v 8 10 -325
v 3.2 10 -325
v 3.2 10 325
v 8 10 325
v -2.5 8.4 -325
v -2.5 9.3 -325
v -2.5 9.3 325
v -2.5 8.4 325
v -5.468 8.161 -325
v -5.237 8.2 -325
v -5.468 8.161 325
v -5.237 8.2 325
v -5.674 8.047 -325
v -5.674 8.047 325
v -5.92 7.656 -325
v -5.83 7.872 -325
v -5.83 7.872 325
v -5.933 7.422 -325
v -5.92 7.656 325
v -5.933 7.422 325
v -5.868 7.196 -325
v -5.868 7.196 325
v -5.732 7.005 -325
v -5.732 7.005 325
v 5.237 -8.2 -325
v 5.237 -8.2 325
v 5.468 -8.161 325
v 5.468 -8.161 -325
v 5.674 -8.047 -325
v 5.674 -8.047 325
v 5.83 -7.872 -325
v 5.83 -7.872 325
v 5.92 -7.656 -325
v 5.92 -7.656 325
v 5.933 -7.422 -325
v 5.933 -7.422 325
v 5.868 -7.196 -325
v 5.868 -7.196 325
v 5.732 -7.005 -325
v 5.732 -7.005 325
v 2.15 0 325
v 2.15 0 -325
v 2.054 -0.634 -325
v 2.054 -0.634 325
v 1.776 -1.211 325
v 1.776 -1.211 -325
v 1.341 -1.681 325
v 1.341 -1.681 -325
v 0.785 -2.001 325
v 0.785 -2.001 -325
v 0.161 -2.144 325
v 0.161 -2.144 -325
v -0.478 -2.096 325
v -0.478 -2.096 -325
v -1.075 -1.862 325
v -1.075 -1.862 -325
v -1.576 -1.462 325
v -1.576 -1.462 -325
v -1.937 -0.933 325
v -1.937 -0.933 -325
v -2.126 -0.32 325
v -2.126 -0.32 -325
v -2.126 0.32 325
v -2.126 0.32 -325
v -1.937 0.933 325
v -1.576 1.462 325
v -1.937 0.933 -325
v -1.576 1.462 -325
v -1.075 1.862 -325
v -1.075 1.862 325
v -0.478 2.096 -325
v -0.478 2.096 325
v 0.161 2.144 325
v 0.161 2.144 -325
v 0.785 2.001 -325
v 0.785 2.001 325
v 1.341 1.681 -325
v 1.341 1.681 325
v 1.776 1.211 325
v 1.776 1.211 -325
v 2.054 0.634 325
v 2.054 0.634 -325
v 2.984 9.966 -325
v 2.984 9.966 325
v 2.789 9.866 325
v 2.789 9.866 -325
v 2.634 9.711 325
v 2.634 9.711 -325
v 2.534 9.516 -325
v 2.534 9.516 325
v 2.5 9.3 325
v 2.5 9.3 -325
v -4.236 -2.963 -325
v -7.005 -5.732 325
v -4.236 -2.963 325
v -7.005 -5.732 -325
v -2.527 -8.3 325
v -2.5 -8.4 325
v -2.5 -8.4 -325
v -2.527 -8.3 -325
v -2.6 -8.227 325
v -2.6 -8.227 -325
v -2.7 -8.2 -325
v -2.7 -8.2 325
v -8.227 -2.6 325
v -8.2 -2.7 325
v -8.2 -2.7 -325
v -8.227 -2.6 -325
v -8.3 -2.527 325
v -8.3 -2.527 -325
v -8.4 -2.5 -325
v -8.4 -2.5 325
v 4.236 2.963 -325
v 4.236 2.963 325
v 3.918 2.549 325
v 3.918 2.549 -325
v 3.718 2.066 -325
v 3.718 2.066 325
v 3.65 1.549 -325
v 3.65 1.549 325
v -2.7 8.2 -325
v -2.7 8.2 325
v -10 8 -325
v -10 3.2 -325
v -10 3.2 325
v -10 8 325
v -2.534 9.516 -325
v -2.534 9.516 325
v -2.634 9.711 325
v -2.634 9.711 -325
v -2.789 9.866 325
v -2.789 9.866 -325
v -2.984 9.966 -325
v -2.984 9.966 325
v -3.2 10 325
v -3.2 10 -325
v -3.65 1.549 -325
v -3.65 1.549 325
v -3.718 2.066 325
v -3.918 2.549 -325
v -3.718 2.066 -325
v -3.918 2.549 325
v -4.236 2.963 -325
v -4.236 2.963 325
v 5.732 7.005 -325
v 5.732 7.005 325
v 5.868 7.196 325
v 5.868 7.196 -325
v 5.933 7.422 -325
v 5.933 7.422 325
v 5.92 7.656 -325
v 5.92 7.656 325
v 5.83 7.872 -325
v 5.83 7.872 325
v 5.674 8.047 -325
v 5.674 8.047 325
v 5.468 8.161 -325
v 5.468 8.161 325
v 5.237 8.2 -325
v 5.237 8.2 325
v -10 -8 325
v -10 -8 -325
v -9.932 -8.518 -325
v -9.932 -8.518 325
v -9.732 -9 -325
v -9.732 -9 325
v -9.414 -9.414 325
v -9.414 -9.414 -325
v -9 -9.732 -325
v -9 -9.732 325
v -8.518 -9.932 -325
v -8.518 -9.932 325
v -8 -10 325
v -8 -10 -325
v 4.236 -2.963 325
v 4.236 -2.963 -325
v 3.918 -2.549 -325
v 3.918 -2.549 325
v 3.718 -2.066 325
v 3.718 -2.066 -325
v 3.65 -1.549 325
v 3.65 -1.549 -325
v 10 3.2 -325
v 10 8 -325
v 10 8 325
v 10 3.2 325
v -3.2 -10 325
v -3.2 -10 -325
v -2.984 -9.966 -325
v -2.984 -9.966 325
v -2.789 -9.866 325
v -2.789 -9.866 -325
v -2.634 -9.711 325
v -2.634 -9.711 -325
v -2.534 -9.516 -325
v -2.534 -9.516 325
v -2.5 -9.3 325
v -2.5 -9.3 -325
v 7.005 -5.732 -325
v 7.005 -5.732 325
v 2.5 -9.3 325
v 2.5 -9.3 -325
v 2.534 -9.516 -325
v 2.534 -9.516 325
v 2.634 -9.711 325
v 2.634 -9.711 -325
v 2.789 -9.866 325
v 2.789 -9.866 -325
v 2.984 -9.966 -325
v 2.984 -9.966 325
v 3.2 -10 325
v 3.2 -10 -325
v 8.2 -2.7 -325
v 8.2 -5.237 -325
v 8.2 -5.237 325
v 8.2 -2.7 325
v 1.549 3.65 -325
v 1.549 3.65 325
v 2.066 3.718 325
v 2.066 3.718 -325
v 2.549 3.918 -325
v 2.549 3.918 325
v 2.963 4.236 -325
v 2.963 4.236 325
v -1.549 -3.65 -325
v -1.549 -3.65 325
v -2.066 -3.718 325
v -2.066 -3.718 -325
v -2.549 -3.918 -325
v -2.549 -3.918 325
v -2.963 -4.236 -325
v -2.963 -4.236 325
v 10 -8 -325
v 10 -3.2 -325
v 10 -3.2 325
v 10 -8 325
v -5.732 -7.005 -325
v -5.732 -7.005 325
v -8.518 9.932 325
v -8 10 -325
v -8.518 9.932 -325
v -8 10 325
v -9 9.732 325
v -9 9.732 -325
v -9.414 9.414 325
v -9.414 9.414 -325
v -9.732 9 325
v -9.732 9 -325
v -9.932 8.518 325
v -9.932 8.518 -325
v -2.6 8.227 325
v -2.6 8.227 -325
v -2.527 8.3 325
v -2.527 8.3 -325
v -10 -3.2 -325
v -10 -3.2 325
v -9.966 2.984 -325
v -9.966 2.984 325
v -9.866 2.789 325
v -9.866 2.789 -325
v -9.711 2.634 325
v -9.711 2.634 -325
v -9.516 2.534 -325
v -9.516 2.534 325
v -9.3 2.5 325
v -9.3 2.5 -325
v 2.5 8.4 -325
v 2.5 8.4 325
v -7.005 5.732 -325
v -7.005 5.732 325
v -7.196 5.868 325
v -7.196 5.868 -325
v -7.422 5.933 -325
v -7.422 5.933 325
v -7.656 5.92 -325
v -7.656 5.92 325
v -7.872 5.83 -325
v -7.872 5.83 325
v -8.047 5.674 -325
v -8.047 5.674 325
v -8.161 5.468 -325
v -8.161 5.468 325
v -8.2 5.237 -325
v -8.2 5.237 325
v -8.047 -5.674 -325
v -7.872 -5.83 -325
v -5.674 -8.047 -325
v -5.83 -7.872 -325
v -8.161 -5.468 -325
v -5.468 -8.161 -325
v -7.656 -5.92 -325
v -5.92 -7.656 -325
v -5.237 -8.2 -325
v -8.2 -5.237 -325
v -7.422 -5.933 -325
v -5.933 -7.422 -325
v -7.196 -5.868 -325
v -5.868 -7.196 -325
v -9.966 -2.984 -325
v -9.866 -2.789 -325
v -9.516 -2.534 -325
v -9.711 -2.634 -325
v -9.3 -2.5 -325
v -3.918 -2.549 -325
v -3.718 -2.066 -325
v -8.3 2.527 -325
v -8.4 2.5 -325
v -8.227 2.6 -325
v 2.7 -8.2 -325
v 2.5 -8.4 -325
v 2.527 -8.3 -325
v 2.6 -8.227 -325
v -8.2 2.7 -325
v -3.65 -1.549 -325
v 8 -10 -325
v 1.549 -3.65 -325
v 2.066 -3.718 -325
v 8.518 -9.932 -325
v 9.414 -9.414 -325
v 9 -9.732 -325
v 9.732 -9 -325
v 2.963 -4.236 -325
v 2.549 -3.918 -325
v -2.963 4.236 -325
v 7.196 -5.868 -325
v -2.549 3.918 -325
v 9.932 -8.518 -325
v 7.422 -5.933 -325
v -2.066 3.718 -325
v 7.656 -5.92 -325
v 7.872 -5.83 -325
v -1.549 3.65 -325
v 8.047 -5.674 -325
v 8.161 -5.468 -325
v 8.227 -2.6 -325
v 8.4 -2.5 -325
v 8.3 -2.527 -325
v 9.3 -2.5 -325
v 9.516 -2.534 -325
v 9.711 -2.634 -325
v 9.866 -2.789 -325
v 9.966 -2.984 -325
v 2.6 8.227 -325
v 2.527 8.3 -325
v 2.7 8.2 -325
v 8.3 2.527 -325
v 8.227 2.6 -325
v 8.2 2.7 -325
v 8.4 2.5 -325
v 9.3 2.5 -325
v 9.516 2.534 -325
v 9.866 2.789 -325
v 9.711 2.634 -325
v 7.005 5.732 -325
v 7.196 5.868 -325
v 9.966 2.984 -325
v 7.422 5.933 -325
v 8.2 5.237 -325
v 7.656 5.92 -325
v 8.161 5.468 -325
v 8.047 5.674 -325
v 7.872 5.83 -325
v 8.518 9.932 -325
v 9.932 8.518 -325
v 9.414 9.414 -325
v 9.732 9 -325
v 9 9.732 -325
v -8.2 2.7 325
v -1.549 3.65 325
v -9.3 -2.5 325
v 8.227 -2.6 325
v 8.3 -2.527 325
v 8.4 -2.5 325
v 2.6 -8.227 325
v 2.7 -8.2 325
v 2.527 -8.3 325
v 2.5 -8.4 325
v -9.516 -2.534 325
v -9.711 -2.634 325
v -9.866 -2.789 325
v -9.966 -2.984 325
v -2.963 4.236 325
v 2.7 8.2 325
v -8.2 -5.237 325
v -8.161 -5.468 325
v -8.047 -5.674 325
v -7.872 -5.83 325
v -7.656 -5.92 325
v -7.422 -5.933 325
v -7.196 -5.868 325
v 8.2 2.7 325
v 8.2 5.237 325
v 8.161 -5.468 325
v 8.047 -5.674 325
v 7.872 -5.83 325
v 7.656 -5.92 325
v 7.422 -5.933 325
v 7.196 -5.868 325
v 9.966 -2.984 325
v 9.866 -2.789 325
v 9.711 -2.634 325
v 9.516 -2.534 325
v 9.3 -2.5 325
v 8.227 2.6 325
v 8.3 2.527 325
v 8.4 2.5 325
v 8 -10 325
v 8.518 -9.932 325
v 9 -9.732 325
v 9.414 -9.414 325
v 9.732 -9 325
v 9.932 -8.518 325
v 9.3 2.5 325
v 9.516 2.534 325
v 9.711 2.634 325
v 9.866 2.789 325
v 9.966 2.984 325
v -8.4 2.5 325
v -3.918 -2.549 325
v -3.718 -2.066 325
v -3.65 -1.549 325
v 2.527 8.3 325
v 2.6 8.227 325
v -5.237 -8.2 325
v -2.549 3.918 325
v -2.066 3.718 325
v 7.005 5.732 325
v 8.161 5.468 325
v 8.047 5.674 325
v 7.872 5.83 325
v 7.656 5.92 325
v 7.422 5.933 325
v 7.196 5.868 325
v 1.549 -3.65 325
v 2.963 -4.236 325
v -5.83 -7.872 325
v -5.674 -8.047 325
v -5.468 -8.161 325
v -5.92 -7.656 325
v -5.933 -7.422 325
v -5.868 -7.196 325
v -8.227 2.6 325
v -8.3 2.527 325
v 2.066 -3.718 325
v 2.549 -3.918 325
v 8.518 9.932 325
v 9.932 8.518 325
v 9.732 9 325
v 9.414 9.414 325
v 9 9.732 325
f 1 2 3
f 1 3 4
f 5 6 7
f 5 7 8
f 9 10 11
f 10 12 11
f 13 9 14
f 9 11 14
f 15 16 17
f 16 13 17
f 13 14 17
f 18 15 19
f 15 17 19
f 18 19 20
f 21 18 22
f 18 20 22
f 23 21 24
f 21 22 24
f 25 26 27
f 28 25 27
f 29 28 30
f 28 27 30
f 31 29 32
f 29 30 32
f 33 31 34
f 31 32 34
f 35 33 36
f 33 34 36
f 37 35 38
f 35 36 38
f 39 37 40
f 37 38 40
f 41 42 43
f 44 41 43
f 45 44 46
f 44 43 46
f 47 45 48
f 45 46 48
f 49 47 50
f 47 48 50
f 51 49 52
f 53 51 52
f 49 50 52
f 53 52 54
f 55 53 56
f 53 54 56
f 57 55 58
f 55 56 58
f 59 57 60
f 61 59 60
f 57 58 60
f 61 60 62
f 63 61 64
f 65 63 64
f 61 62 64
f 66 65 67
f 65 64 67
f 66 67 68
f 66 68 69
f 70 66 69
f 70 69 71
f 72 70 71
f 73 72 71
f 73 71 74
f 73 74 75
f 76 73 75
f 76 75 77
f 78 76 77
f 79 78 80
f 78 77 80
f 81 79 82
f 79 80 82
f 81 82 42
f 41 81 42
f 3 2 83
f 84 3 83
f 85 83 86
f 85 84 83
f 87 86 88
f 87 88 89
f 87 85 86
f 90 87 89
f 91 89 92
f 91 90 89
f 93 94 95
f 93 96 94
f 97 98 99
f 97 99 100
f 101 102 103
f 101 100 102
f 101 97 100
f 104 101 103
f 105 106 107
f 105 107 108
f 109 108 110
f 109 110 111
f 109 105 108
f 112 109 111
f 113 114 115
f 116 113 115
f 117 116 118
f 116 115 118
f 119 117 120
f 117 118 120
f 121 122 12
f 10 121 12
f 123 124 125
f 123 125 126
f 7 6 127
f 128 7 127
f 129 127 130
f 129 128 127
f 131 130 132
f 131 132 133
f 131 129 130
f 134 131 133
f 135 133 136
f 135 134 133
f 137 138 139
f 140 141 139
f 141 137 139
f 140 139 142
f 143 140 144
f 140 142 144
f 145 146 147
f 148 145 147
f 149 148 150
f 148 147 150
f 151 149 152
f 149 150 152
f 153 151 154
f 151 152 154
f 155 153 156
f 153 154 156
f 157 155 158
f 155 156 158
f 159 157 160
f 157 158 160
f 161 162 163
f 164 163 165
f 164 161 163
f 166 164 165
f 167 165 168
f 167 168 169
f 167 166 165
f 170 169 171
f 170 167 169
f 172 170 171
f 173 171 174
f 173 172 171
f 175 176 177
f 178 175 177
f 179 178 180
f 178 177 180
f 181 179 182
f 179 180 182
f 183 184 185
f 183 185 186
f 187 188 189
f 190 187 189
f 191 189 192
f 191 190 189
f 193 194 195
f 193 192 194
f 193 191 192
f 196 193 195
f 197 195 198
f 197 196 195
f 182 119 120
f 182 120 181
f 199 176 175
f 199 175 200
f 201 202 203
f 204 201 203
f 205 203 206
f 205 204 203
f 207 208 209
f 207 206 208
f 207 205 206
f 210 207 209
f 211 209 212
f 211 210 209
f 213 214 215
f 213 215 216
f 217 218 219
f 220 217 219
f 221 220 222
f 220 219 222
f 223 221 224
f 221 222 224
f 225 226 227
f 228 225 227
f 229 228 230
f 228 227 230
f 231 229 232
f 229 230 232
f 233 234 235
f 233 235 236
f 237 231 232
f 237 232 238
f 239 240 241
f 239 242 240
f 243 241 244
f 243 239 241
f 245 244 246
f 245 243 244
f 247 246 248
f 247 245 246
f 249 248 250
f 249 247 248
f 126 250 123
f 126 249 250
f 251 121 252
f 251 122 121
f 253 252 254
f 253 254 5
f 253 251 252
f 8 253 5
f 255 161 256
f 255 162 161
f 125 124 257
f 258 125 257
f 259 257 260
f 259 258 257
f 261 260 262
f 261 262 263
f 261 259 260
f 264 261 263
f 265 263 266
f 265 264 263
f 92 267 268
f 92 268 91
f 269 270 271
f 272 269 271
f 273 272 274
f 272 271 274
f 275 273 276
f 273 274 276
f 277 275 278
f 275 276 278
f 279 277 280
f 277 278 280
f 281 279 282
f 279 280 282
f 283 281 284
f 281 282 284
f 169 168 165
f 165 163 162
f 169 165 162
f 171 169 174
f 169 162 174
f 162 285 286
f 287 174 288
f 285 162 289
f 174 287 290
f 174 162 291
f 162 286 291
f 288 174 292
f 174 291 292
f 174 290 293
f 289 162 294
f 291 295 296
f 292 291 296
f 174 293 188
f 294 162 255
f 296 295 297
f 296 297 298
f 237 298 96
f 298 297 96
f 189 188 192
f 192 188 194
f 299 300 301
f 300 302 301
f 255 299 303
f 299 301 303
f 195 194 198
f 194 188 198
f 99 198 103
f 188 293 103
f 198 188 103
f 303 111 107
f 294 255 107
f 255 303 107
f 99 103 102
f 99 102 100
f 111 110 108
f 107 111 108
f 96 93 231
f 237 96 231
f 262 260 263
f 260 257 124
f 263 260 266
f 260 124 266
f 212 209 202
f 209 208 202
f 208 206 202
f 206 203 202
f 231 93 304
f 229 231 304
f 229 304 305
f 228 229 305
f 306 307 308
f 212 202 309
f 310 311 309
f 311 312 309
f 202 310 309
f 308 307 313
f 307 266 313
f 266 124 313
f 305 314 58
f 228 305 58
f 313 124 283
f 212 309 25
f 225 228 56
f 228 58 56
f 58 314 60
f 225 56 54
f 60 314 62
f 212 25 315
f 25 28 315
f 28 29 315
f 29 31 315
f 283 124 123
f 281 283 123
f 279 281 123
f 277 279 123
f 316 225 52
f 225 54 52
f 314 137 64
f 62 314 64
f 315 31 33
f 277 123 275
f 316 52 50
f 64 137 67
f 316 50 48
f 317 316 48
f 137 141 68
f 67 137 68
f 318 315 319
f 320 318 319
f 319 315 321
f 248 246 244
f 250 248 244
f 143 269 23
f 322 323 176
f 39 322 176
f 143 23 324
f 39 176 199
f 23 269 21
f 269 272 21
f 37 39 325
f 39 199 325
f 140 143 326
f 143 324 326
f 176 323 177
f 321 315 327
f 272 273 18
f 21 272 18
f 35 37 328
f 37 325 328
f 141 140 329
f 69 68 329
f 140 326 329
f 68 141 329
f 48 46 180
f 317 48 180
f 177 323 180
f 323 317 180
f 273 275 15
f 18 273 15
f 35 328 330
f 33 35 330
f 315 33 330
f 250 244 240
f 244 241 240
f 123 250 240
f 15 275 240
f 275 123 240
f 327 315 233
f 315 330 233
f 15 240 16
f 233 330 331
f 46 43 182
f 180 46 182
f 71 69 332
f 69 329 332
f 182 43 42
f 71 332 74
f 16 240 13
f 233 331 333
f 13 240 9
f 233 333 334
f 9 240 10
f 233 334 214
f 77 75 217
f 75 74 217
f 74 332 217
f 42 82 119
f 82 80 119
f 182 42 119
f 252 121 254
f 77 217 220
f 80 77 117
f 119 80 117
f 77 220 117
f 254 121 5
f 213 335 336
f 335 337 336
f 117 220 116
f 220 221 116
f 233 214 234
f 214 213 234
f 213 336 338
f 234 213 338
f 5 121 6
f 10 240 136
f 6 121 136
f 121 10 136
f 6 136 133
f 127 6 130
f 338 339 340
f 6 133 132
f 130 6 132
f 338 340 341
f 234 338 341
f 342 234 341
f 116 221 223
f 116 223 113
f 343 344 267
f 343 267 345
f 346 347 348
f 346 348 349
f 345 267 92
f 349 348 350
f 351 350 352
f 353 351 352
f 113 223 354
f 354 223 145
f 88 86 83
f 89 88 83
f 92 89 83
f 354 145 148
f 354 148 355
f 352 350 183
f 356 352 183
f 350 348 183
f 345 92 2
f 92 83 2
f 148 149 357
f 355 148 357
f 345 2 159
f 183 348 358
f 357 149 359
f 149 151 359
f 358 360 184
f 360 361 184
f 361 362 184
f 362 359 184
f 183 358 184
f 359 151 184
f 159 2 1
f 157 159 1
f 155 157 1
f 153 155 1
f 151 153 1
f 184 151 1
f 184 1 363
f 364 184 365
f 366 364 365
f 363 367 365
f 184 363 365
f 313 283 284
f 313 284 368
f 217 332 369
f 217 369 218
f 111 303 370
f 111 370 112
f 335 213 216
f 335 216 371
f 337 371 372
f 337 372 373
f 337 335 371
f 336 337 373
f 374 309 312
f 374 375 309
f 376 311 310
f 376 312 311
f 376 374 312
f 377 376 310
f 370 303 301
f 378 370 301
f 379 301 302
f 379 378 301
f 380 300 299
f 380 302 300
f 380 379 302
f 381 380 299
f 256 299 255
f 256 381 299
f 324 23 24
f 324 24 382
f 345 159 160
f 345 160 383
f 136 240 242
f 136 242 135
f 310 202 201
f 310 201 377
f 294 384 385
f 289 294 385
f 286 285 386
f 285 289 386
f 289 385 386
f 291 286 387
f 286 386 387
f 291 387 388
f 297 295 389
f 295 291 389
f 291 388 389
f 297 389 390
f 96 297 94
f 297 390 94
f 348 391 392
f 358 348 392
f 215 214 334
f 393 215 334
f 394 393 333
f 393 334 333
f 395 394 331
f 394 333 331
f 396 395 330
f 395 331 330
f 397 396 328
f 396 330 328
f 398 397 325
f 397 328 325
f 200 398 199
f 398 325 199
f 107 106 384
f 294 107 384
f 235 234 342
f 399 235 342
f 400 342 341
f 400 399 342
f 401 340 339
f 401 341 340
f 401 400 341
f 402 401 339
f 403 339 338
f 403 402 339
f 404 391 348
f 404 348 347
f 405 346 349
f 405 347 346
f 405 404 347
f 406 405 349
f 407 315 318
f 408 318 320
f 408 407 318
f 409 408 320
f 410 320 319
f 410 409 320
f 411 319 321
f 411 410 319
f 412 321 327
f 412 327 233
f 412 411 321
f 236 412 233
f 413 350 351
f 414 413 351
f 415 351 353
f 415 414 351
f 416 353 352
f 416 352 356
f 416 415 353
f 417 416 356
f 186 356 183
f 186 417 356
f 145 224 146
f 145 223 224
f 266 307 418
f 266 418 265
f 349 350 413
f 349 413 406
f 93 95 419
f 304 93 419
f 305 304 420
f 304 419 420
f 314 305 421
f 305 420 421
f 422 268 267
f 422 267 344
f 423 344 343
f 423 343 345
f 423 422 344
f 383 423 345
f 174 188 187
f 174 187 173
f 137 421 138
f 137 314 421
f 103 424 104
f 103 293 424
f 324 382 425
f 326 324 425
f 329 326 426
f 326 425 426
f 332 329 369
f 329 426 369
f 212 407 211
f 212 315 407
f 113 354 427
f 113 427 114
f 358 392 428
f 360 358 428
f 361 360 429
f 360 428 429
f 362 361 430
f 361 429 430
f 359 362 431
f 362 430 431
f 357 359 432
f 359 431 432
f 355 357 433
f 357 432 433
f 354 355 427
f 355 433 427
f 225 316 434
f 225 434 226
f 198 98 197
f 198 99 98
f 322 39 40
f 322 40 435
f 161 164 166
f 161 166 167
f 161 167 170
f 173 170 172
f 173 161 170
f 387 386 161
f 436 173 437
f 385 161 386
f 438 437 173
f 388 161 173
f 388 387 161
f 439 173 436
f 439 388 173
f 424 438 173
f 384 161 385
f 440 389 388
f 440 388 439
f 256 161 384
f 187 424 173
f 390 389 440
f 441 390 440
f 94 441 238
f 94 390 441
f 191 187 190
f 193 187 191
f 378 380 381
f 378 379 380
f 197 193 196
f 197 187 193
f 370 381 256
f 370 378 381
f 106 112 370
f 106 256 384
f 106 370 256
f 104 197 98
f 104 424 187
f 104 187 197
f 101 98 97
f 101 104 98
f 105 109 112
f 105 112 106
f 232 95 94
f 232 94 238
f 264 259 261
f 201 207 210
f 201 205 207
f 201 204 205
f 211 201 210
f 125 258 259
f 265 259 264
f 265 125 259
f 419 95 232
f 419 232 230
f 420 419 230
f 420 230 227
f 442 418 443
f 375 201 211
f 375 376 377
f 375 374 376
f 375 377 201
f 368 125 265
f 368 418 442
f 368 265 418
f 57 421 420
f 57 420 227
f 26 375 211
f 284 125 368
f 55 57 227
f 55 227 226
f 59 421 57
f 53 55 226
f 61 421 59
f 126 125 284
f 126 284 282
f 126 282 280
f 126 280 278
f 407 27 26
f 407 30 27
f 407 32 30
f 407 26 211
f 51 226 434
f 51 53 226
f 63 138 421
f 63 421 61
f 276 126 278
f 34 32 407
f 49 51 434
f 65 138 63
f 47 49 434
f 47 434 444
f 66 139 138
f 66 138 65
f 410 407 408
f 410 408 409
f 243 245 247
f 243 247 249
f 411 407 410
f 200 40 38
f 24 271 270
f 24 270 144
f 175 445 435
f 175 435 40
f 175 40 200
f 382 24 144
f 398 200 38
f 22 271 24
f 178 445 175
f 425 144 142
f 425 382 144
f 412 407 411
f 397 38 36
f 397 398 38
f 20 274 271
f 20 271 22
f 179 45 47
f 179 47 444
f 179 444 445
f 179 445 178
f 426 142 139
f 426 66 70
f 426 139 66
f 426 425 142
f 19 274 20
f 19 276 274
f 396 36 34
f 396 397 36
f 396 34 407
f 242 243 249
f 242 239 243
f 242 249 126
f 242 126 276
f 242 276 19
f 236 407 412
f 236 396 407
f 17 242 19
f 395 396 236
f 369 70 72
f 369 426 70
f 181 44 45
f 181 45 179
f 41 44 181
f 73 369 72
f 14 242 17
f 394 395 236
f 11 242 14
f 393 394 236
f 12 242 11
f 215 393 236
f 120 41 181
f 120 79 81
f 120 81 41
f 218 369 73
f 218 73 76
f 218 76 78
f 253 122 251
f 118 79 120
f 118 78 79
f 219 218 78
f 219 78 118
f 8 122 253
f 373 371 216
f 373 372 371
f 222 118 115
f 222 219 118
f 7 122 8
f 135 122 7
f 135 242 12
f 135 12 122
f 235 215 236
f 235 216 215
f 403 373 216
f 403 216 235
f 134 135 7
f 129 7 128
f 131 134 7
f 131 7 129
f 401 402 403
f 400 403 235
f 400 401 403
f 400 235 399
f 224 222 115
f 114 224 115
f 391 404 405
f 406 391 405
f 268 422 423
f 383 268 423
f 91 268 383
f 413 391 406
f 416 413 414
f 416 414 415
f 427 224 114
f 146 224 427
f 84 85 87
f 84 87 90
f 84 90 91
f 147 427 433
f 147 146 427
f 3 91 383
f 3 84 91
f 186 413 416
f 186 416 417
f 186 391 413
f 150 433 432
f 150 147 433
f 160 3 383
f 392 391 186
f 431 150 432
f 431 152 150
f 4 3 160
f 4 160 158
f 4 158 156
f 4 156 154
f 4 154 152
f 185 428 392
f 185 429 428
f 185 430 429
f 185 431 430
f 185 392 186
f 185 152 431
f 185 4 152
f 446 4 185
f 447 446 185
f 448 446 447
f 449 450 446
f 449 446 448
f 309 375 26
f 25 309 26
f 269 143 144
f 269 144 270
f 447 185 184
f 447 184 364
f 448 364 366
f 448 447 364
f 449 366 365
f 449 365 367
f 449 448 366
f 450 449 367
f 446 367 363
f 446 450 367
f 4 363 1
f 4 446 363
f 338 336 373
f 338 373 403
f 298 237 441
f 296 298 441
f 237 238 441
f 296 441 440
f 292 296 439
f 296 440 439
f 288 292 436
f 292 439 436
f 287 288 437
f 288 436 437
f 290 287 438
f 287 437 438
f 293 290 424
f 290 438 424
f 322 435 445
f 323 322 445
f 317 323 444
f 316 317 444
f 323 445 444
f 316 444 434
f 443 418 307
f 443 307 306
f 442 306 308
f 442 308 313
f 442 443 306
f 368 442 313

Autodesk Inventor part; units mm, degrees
ref_plane "YZ Plane" through (0, 0, 0) normal (1, 0, 0) x (0, 1, 0)
ref_plane "XZ Plane" through (0, 0, 0) normal (0, 1, 0) x (-1, 0, 0)
ref_plane "XY Plane" through (0, 0, 0) normal (0, 0, 1) x (1, 0, 0)
sketch "Sketch1" plane through (0, 0, 0) normal (0, 0, 1) x (1, 0, 0)
  circle A0 centre (0, 0) radius 2.15
  line L0 (-10, 10) -> (-2.5, 10)
  line L1 (-2.5, 10) -> (-2.5, 8.2)
  line L2 (-2.5, 8.2) -> (-6.9272, 8.2)
  line L3 (-6.9272, 8.2) -> (-2.3772, 3.65)
  line L4 (-2.3772, 3.65) -> (2.3772, 3.65)
  line L5 (2.3772, 3.65) -> (6.9272, 8.2)
  line L6 (6.9272, 8.2) -> (2.5, 8.2)
  line L7 (2.5, 8.2) -> (2.5, 10)
  line L8 (2.5, 10) -> (10, 10)
  line L9 (10, 10) -> (10, 2.5)
  line L10 (10, 2.5) -> (8.2, 2.5)
  line L11 (8.2, 2.5) -> (8.2, 6.9272)
  line L12 (8.2, 6.9272) -> (3.65, 2.3772)
  line L13 (3.65, 2.3772) -> (3.65, -2.3772)
  line L14 (3.65, -2.3772) -> (8.2, -6.9272)
  line L15 (8.2, -6.9272) -> (8.2, -2.5)
  line L16 (8.2, -2.5) -> (10, -2.5)
  line L17 (10, -2.5) -> (10, -10)
  line L18 (10, -10) -> (2.5, -10)
  line L19 (2.5, -10) -> (2.5, -8.2)
  line L20 (2.5, -8.2) -> (6.9272, -8.2)
  line L21 (6.9272, -8.2) -> (2.3772, -3.65)
  line L22 (2.3772, -3.65) -> (-2.3772, -3.65)
  line L23 (-2.3772, -3.65) -> (-6.9272, -8.2)
  line L24 (-6.9272, -8.2) -> (-2.5, -8.2)
  line L25 (-2.5, -8.2) -> (-2.5, -10)
  line L26 (-2.5, -10) -> (-10, -10)
  line L27 (-10, -10) -> (-10, -2.5)
  line L28 (-10, -2.5) -> (-8.2, -2.5)
  line L29 (-8.2, -2.5) -> (-8.2, -6.9272)
  line L30 (-8.2, -6.9272) -> (-3.65, -2.3772)
  line L31 (-3.65, -2.3772) -> (-3.65, 2.3772)
  line L32 (-3.65, 2.3772) -> (-8.2, 6.9272)
  line L33 (-8.2, 6.9272) -> (-8.2, 2.5)
  line L34 (-8.2, 2.5) -> (-10, 2.5)
  line L35 (-10, 2.5) -> (-10, 10)
  line L36 (0, 0) -> (-30.8654, 30.8654)
  line L37 (0, 0) -> (30.8654, 30.8654)
  line L38 (0, 0) -> (42.5392, 0)
  line L39 (0, 0) -> (0, 44.3419)
  dimension "d0" = 45
  dimension "d1" = 90
  dimension "Breite" = 20
  dimension "Tiefe_Schiene" = 6.35
  dimension "d2" = 1.8
  dimension "Durchmesser_Loch" = 4.3
  dimension "Wandstaerke" = 1.8
  dimension "d3" = 1.8
  dimension "Breite_Schiene" = 5
  dimension "d4" = 5
extrude "Extrusion1" add sketch "Sketch1" along normal mid plane 650 contours L38 L13 L14 L15 L16 L17 L18 L19 L20 L21 L22 L23 L24 L25 L26 L27 L28 L29 L30 L31 L32 L33 L34 L35 L36 A0 | A0 L37 L9 L10 L11 L12 L13 L38 | A0 L39 L4 L5 L6 L7 L8 L37 | L36 L0 L1 L2 L3 L4 L39 A0
fillet "Fillet1" radius 2 4 edges at (10, 10, 0) (-10, 10, 0) (10, -10, 0) (-10, -10, 0)
fillet "Fillet2" radius 0.2 8 edges at (-2.5, 8.2, 0) (2.5, 8.2, 0) (8.2, 2.5, 0) (8.2, -2.5, 0) (-2.5, -8.2, 0) (-8.2, -2.5, 0) (-8.2, 2.5, 0) (2.5, -8.2, 0)
fillet "Fillet3" radius 0.7 16 edges at (-2.5, 10, 0) (2.5, 10, 0) (10, 2.5, 0) (10, -2.5, 0) (2.5, -10, 0) (-2.5, -10, 0) (-10, -2.5, 0) (-10, 2.5, 0) (-6.9272, -8.2, 0) (-8.2, -6.9272, 0) (6.9272, -8.2, 0) (8.2, -6.9272, 0) (8.2, 6.9272, 0) (6.9272, 8.2, 0) (-6.9272, 8.2, 0) (-8.2, 6.9272, 0)
fillet "Fillet4" radius 2 8 edges at (-3.65, 2.3772, 0) (-2.3772, 3.65, 0) (2.3772, 3.65, 0) (3.65, 2.3772, 0) (3.65, -2.3772, 0) (2.3772, -3.65, 0) (-2.3772, -3.65, 0) (-3.65, -2.3772, 0)
equation "\"d2\" = Wandstaerke"
equation "\"d3\" = Wandstaerke"
equation "\"d4\" = Breite_Schiene"
properties part number "ITEM_20x20_650mm"
